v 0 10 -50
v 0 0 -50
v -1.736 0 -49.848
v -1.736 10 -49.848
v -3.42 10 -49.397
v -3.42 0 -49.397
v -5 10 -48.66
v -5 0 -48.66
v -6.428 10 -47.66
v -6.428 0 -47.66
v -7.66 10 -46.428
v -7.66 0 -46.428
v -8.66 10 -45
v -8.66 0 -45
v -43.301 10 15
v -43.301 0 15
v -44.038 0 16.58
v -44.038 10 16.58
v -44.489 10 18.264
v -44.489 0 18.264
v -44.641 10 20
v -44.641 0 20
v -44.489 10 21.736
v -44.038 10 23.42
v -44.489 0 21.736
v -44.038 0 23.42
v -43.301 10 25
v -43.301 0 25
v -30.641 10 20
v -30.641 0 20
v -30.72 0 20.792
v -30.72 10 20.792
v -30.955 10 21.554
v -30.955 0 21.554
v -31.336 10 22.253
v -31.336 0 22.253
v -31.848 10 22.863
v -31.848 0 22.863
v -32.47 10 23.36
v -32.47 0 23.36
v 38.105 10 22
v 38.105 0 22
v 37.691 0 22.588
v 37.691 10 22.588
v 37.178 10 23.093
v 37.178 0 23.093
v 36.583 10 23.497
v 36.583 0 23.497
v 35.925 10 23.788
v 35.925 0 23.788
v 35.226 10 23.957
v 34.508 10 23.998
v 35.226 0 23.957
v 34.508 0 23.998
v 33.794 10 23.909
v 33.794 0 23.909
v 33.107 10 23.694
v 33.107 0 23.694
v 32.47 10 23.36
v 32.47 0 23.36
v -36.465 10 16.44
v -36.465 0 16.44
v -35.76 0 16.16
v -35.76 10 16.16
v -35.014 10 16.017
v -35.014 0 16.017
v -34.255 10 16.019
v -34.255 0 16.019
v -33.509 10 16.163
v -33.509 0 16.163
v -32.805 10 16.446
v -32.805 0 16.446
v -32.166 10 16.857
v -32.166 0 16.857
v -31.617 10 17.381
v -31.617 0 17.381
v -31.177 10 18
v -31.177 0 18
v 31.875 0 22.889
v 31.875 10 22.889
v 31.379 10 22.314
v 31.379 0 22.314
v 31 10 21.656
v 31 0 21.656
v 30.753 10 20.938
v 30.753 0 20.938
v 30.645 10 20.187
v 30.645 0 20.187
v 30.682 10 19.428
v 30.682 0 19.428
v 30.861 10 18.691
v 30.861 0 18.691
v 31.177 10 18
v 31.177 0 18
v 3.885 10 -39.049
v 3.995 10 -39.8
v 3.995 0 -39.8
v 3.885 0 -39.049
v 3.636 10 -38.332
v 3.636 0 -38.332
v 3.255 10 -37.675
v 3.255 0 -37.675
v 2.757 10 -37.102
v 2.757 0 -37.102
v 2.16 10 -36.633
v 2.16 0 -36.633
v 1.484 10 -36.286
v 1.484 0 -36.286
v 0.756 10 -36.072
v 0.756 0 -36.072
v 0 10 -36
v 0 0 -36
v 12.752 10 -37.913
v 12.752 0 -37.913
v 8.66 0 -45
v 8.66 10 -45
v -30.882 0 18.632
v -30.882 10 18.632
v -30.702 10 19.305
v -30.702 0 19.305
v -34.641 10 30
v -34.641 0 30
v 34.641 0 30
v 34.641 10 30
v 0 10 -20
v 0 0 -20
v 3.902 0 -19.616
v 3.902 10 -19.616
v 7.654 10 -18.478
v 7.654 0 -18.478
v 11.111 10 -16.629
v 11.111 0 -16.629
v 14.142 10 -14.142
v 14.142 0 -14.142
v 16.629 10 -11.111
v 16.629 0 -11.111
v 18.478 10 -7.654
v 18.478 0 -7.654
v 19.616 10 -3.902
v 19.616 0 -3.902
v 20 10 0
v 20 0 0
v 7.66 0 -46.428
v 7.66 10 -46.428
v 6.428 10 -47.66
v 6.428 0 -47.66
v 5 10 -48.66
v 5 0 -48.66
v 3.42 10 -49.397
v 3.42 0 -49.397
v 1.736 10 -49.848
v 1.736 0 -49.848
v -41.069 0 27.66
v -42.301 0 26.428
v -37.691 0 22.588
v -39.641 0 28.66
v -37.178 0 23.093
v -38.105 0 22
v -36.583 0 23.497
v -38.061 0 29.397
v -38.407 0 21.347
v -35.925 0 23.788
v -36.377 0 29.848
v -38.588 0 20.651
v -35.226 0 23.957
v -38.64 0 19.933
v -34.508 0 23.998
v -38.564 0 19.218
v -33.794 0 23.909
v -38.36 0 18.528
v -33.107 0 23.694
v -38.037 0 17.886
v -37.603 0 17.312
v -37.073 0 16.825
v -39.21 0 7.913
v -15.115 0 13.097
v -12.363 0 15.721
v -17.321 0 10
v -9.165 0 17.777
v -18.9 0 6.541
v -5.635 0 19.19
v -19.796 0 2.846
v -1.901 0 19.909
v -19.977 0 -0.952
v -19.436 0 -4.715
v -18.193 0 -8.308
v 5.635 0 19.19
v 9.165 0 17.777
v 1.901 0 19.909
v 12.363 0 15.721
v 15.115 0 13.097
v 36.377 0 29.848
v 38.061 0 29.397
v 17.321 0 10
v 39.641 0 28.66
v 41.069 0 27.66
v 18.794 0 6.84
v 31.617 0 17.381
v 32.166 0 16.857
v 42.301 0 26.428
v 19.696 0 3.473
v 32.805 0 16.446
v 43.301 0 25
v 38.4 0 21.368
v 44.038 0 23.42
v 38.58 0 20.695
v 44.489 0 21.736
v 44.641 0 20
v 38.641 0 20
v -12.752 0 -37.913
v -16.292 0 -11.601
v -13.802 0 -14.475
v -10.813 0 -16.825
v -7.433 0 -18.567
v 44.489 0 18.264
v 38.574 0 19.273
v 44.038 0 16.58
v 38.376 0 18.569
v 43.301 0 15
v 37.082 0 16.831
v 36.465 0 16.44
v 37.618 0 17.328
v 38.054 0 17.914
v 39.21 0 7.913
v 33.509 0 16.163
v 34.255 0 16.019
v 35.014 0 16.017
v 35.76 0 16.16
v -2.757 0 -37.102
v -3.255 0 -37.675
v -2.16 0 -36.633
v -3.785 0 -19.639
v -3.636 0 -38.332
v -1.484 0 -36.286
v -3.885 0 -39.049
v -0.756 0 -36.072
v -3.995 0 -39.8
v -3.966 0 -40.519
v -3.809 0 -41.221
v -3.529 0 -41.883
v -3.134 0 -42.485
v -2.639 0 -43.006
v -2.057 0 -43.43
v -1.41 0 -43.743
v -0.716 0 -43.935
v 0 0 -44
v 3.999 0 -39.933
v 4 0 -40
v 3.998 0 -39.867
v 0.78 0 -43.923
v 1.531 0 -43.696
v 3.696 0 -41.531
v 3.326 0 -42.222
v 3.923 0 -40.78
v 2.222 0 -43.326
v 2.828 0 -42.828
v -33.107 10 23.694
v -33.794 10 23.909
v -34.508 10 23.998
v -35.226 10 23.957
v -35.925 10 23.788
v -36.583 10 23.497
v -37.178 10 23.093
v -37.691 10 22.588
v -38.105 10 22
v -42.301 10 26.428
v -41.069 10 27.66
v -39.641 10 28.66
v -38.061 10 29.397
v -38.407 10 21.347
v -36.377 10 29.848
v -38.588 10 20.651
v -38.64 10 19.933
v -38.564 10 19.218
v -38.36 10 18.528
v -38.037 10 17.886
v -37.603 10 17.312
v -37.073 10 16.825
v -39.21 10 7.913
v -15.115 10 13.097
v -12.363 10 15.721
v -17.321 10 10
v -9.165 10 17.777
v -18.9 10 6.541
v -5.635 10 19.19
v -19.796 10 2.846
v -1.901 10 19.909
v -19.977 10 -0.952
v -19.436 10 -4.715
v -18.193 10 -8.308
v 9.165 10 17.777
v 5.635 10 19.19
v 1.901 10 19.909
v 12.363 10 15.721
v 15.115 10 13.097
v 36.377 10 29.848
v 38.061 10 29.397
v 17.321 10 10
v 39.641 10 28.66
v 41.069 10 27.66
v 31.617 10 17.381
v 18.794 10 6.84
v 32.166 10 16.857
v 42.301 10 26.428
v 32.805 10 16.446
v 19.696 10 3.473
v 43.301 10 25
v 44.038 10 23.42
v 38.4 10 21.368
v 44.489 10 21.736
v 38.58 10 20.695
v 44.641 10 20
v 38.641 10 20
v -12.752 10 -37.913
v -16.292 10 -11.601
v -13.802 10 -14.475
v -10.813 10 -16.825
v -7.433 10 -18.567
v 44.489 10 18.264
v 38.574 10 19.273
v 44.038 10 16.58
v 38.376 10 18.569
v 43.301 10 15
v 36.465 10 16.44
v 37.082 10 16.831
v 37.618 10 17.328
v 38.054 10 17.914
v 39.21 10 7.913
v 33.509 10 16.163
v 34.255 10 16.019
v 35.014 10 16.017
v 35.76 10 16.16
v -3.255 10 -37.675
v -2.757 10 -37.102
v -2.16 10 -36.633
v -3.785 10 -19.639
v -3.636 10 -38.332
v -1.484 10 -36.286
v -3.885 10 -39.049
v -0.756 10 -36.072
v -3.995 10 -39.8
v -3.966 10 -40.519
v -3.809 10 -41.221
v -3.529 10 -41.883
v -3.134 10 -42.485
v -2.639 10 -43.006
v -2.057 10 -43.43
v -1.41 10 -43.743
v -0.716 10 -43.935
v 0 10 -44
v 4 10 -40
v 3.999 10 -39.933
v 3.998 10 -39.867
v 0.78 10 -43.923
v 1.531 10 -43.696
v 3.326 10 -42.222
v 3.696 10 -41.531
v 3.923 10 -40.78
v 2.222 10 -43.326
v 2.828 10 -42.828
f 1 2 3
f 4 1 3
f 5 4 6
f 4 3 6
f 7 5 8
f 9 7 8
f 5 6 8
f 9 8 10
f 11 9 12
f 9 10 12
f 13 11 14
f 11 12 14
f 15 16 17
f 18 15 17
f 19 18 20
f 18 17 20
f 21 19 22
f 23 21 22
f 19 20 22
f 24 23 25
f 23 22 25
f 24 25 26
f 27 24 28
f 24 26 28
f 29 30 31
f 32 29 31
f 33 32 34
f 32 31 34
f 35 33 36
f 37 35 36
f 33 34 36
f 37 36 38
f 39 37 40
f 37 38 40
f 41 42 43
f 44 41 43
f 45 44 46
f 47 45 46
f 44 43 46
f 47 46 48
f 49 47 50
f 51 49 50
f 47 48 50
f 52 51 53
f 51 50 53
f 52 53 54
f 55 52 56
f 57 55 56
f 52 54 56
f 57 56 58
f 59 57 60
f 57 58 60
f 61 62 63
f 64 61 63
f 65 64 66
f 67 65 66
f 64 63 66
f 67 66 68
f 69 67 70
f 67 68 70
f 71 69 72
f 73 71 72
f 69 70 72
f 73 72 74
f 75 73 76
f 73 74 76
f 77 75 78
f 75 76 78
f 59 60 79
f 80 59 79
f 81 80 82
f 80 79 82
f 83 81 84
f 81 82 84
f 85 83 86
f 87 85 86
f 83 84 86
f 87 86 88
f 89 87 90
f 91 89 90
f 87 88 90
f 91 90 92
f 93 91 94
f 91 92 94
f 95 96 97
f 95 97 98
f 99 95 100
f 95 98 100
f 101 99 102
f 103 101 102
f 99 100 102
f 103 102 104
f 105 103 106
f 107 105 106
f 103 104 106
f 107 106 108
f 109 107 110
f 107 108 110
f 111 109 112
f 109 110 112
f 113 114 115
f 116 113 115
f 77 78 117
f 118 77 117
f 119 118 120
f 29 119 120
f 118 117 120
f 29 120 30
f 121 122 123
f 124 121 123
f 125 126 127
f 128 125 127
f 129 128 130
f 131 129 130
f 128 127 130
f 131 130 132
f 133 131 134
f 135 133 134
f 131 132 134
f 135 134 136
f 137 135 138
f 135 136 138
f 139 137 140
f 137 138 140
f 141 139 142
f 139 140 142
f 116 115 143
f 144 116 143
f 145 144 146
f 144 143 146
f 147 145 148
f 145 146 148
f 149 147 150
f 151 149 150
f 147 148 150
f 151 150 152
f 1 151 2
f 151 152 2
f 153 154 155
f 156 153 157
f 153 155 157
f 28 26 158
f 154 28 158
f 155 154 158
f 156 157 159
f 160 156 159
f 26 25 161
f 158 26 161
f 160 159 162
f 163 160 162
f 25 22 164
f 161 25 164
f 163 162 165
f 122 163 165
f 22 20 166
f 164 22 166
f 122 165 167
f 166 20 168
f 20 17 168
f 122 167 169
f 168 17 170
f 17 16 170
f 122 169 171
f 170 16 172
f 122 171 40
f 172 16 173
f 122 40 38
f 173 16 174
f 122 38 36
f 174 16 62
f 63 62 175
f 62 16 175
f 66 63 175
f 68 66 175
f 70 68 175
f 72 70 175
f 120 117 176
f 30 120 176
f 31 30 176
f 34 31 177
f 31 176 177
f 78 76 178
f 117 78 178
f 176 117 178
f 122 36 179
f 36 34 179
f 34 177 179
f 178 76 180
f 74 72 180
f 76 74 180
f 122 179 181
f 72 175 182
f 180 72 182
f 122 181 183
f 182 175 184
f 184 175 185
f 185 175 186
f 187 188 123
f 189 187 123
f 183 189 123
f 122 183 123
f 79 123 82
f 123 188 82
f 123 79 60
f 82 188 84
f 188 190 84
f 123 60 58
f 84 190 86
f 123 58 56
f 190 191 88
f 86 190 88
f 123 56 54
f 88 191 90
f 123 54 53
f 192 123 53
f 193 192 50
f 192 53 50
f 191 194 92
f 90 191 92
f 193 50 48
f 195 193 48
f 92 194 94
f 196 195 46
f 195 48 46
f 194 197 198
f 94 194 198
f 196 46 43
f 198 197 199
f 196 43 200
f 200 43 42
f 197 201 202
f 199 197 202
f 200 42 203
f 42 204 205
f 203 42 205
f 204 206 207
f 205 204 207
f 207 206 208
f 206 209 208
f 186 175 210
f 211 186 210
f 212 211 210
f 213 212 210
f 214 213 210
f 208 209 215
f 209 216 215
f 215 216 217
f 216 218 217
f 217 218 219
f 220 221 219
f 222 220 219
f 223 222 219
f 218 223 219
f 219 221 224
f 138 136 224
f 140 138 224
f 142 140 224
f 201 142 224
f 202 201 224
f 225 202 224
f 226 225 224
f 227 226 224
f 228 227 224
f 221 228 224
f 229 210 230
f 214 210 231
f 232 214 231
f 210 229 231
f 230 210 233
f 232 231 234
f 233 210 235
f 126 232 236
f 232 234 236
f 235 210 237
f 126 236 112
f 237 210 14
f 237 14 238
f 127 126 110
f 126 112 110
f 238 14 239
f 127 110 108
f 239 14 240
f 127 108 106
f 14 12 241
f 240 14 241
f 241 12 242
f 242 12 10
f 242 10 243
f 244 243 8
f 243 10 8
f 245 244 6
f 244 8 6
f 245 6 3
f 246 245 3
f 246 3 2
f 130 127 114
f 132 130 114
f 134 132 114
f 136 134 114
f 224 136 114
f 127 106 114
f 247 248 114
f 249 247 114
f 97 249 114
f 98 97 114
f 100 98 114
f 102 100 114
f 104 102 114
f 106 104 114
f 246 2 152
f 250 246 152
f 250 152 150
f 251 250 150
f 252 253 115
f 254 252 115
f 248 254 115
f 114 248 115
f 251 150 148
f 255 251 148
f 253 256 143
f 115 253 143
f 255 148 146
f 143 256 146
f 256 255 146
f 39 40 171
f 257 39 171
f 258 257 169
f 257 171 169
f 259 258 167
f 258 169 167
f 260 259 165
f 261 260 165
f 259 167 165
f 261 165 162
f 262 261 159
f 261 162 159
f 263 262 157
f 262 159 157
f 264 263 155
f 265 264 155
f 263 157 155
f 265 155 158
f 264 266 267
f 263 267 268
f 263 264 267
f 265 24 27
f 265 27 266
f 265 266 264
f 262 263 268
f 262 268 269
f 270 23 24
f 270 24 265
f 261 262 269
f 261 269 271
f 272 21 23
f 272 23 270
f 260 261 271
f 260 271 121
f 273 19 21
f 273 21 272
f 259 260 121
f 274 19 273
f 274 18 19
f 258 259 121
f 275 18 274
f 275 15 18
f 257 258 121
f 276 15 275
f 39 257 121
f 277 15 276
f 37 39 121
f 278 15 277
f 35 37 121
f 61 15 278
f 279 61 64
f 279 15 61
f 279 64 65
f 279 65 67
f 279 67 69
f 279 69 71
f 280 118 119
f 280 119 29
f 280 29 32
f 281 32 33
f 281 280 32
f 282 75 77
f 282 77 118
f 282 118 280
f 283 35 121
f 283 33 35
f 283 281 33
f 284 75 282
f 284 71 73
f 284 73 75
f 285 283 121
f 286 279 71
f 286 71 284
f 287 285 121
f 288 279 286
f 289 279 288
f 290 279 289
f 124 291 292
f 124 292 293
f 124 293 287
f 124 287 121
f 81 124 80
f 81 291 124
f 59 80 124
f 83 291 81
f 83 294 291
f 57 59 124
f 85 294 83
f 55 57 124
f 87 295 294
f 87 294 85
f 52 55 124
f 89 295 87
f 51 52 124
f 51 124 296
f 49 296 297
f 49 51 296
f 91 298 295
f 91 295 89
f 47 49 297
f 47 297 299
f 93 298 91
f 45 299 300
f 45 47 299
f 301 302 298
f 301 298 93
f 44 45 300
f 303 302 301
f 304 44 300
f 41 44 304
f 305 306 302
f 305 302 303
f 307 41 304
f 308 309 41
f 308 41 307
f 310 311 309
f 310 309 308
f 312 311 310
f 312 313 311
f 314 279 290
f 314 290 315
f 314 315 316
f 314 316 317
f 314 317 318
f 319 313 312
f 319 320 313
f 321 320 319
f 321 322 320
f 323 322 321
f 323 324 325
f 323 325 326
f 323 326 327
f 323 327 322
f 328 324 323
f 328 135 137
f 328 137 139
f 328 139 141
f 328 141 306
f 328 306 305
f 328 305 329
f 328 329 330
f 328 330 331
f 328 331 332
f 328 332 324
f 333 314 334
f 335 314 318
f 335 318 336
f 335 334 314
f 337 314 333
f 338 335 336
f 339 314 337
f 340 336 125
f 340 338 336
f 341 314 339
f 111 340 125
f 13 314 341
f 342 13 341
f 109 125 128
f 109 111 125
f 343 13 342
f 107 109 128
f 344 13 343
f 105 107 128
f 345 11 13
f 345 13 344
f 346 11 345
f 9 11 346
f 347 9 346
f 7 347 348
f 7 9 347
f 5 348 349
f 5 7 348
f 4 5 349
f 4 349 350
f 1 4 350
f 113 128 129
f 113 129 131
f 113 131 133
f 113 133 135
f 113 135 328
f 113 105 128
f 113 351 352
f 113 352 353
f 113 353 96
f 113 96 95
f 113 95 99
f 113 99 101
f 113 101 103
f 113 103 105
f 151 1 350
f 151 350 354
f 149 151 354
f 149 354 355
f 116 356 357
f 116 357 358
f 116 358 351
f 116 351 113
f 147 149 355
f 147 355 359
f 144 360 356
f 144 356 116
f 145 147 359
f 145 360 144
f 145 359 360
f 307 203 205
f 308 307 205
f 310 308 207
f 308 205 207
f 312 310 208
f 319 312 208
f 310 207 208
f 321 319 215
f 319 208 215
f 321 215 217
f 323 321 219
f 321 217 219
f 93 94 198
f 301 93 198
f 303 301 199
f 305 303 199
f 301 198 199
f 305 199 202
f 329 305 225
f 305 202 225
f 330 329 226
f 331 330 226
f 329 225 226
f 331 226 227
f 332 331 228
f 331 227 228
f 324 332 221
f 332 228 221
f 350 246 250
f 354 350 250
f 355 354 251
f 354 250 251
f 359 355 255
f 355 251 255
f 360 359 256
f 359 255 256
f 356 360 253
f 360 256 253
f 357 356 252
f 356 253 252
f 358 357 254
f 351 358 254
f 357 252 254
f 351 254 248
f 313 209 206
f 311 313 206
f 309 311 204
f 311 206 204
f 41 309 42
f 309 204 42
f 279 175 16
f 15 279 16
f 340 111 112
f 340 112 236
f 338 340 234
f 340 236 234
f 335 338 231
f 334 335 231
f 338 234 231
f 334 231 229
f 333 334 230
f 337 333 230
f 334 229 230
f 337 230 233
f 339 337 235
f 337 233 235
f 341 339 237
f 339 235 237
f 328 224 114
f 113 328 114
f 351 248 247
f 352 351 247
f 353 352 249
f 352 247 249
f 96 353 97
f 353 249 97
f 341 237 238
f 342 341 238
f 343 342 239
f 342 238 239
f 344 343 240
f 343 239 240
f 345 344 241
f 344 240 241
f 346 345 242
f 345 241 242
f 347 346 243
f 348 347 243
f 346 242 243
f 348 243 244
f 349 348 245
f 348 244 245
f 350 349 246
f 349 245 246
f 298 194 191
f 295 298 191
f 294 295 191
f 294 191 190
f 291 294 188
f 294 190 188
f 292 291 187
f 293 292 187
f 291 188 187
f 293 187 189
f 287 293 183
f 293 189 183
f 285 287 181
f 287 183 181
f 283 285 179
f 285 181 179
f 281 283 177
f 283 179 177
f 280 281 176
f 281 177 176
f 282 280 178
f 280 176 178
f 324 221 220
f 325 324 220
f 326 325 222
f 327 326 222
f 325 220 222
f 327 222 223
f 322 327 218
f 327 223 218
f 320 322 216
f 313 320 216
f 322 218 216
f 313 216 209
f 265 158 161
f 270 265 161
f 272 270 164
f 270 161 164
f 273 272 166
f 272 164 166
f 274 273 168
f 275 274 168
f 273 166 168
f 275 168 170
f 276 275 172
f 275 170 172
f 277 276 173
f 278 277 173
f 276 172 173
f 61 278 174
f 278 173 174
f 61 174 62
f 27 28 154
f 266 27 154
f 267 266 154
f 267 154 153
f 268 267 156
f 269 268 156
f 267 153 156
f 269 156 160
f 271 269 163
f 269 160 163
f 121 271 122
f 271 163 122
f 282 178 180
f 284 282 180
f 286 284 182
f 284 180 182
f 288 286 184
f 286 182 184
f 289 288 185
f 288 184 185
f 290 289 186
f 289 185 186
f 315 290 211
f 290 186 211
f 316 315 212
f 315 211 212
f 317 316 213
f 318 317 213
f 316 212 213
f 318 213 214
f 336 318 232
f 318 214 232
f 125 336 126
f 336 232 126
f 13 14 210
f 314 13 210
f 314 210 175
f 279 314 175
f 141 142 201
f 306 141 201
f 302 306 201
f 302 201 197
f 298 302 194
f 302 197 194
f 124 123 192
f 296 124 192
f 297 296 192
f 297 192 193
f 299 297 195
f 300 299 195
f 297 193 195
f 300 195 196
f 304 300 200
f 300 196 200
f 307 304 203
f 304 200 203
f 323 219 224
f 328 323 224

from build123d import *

# Parameters (mm, degrees)
RESSALTO_EXTRUS_O1_DEPTH = 10


with BuildPart() as part:
    # Esboço1 → Ressalto-extrusão1 (new body)
    with BuildSketch(Plane(origin=(0, 0, 0), x_dir=(1, 0, 0), z_dir=(0, 1, 0))):
        with BuildLine():
            ThreePointArc((-39.209518669, -7.912878475), (-38.076880663, -12.253618198), (-36.465309506, -16.440231222))
            ThreePointArc((-36.465309506, -16.440231222), (-33.509440947, -16.163395048), (-31.176914536, -18))
            Line((-31.176914536, -18), (-17.320508076, -10))
            ThreePointArc((-17.320508076, -10), (-17.320508076, 10), (0, 20))
            Line((0, 20), (0, 36))
            ThreePointArc((0, 36), (-2.75680975, 37.101724651), (-3.994996871, 39.8))
            ThreePointArc((-3.994996871, 39.8), (-8.426495684, 39.102355051), (-12.752005558, 37.912878475))
            Line((-12.752005558, 37.912878475), (-39.209518669, -7.912878475))
        make_face()
        with BuildLine():
            Line((-8.660254038, 45), (-12.752005558, 37.912878475))
            ThreePointArc((-12.752005558, 37.912878475), (-8.426495684, 39.102355051), (-3.994996871, 39.8))
            ThreePointArc((-3.994996871, 39.8), (-2.898275349, 42.75680975), (0, 44))
            Line((0, 44), (0, 50))
            ThreePointArc((0, 50), (-5, 48.660254038), (-8.660254038, 45))
        make_face()
        with BuildLine():
            ThreePointArc((8.660254038, 45), (5, 48.660254038), (0, 50))
            Line((0, 50), (0, 44))
            ThreePointArc((0, 44), (2.828427125, 42.828427125), (4, 40))
            ThreePointArc((4, 40), (3.998749022, 39.899968716), (3.994996871, 39.8))
            ThreePointArc((3.994996871, 39.8), (8.426495684, 39.102355051), (12.752005558, 37.912878475))
            Line((12.752005558, 37.912878475), (8.660254038, 45))
        make_face()
        with BuildLine():
            Line((0, 36), (0, 20))
            ThreePointArc((0, 20), (14.142135624, 14.142135624), (20, 0))
            ThreePointArc((20, 0), (19.318516526, -5.176380902), (17.320508076, -10))
            Line((17.320508076, -10), (31.176914536, -18))
            ThreePointArc((31.176914536, -18), (33.509440947, -16.163395048), (36.465309506, -16.440231222))
            ThreePointArc((36.465309506, -16.440231222), (38.076880663, -12.253618198), (39.209518669, -7.912878475))
            Line((39.209518669, -7.912878475), (12.752005558, 37.912878475))
            ThreePointArc((12.752005558, 37.912878475), (8.426495684, 39.102355051), (3.994996871, 39.8))
            ThreePointArc((3.994996871, 39.8), (2.75680975, 37.101724651), (0, 36))
        make_face()
        with BuildLine():
            ThreePointArc((-30.641016151, -20), (-31.127982273, -21.912744878), (-32.470312635, -23.359768778))
            ThreePointArc((-32.470312635, -23.359768778), (-29.65038498, -26.848736852), (-26.457513111, -30))
            Line((-26.457513111, -30), (26.457513111, -30))
            ThreePointArc((26.457513111, -30), (29.65038498, -26.848736852), (32.470312635, -23.359768778))
            ThreePointArc((32.470312635, -23.359768778), (30.752631197, -20.938329603), (31.176914536, -18))
            Line((31.176914536, -18), (17.320508076, -10))
            ThreePointArc((17.320508076, -10), (0, -20), (-17.320508076, -10))
            Line((-17.320508076, -10), (-31.176914536, -18))
            ThreePointArc((-31.176914536, -18), (-30.777312846, -18.96472382), (-30.641016151, -20))
        make_face()
        with BuildLine():
            ThreePointArc((-43.301270189, -15), (-44.641016151, -20), (-43.301270189, -25))
            Line((-43.301270189, -25), (-38.105117767, -22))
            ThreePointArc((-38.105117767, -22), (-38.477621103, -18.868424796), (-36.465309506, -16.440231222))
            ThreePointArc((-36.465309506, -16.440231222), (-38.076880663, -12.253618198), (-39.209518669, -7.912878475))
            Line((-39.209518669, -7.912878475), (-43.301270189, -15))
        make_face()
        with BuildLine():
            Line((-38.105117767, -22), (-43.301270189, -25))
            ThreePointArc((-43.301270189, -25), (-39.641016151, -28.660254038), (-34.641016151, -30))
            Line((-34.641016151, -30), (-26.457513111, -30))
            ThreePointArc((-26.457513111, -30), (-29.65038498, -26.848736852), (-32.470312635, -23.359768778))
            ThreePointArc((-32.470312635, -23.359768778), (-35.579345754, -23.888384955), (-38.105117767, -22))
        make_face()
        with BuildLine():
            Line((38.105117767, -22), (43.301270189, -25))
            ThreePointArc((43.301270189, -25), (44.641016151, -20), (43.301270189, -15))
            Line((43.301270189, -15), (39.209518669, -7.912878475))
            ThreePointArc((39.209518669, -7.912878475), (38.076880663, -12.253618198), (36.465309506, -16.440231222))
            ThreePointArc((36.465309506, -16.440231222), (38.054018746, -17.913995856), (38.641016151, -20))
            ThreePointArc((38.641016151, -20), (38.504719457, -21.03527618), (38.105117767, -22))
        make_face()
        with BuildLine():
            ThreePointArc((32.470312635, -23.359768778), (29.65038498, -26.848736852), (26.457513111, -30))
            Line((26.457513111, -30), (34.641016151, -30))
            ThreePointArc((34.641016151, -30), (39.641016151, -28.660254038), (43.301270189, -25))
            Line((43.301270189, -25), (38.105117767, -22))
            ThreePointArc((38.105117767, -22), (35.579345754, -23.888384955), (32.470312635, -23.359768778))
        make_face()
    extrude(amount=RESSALTO_EXTRUS_O1_DEPTH)


solid = part.part
